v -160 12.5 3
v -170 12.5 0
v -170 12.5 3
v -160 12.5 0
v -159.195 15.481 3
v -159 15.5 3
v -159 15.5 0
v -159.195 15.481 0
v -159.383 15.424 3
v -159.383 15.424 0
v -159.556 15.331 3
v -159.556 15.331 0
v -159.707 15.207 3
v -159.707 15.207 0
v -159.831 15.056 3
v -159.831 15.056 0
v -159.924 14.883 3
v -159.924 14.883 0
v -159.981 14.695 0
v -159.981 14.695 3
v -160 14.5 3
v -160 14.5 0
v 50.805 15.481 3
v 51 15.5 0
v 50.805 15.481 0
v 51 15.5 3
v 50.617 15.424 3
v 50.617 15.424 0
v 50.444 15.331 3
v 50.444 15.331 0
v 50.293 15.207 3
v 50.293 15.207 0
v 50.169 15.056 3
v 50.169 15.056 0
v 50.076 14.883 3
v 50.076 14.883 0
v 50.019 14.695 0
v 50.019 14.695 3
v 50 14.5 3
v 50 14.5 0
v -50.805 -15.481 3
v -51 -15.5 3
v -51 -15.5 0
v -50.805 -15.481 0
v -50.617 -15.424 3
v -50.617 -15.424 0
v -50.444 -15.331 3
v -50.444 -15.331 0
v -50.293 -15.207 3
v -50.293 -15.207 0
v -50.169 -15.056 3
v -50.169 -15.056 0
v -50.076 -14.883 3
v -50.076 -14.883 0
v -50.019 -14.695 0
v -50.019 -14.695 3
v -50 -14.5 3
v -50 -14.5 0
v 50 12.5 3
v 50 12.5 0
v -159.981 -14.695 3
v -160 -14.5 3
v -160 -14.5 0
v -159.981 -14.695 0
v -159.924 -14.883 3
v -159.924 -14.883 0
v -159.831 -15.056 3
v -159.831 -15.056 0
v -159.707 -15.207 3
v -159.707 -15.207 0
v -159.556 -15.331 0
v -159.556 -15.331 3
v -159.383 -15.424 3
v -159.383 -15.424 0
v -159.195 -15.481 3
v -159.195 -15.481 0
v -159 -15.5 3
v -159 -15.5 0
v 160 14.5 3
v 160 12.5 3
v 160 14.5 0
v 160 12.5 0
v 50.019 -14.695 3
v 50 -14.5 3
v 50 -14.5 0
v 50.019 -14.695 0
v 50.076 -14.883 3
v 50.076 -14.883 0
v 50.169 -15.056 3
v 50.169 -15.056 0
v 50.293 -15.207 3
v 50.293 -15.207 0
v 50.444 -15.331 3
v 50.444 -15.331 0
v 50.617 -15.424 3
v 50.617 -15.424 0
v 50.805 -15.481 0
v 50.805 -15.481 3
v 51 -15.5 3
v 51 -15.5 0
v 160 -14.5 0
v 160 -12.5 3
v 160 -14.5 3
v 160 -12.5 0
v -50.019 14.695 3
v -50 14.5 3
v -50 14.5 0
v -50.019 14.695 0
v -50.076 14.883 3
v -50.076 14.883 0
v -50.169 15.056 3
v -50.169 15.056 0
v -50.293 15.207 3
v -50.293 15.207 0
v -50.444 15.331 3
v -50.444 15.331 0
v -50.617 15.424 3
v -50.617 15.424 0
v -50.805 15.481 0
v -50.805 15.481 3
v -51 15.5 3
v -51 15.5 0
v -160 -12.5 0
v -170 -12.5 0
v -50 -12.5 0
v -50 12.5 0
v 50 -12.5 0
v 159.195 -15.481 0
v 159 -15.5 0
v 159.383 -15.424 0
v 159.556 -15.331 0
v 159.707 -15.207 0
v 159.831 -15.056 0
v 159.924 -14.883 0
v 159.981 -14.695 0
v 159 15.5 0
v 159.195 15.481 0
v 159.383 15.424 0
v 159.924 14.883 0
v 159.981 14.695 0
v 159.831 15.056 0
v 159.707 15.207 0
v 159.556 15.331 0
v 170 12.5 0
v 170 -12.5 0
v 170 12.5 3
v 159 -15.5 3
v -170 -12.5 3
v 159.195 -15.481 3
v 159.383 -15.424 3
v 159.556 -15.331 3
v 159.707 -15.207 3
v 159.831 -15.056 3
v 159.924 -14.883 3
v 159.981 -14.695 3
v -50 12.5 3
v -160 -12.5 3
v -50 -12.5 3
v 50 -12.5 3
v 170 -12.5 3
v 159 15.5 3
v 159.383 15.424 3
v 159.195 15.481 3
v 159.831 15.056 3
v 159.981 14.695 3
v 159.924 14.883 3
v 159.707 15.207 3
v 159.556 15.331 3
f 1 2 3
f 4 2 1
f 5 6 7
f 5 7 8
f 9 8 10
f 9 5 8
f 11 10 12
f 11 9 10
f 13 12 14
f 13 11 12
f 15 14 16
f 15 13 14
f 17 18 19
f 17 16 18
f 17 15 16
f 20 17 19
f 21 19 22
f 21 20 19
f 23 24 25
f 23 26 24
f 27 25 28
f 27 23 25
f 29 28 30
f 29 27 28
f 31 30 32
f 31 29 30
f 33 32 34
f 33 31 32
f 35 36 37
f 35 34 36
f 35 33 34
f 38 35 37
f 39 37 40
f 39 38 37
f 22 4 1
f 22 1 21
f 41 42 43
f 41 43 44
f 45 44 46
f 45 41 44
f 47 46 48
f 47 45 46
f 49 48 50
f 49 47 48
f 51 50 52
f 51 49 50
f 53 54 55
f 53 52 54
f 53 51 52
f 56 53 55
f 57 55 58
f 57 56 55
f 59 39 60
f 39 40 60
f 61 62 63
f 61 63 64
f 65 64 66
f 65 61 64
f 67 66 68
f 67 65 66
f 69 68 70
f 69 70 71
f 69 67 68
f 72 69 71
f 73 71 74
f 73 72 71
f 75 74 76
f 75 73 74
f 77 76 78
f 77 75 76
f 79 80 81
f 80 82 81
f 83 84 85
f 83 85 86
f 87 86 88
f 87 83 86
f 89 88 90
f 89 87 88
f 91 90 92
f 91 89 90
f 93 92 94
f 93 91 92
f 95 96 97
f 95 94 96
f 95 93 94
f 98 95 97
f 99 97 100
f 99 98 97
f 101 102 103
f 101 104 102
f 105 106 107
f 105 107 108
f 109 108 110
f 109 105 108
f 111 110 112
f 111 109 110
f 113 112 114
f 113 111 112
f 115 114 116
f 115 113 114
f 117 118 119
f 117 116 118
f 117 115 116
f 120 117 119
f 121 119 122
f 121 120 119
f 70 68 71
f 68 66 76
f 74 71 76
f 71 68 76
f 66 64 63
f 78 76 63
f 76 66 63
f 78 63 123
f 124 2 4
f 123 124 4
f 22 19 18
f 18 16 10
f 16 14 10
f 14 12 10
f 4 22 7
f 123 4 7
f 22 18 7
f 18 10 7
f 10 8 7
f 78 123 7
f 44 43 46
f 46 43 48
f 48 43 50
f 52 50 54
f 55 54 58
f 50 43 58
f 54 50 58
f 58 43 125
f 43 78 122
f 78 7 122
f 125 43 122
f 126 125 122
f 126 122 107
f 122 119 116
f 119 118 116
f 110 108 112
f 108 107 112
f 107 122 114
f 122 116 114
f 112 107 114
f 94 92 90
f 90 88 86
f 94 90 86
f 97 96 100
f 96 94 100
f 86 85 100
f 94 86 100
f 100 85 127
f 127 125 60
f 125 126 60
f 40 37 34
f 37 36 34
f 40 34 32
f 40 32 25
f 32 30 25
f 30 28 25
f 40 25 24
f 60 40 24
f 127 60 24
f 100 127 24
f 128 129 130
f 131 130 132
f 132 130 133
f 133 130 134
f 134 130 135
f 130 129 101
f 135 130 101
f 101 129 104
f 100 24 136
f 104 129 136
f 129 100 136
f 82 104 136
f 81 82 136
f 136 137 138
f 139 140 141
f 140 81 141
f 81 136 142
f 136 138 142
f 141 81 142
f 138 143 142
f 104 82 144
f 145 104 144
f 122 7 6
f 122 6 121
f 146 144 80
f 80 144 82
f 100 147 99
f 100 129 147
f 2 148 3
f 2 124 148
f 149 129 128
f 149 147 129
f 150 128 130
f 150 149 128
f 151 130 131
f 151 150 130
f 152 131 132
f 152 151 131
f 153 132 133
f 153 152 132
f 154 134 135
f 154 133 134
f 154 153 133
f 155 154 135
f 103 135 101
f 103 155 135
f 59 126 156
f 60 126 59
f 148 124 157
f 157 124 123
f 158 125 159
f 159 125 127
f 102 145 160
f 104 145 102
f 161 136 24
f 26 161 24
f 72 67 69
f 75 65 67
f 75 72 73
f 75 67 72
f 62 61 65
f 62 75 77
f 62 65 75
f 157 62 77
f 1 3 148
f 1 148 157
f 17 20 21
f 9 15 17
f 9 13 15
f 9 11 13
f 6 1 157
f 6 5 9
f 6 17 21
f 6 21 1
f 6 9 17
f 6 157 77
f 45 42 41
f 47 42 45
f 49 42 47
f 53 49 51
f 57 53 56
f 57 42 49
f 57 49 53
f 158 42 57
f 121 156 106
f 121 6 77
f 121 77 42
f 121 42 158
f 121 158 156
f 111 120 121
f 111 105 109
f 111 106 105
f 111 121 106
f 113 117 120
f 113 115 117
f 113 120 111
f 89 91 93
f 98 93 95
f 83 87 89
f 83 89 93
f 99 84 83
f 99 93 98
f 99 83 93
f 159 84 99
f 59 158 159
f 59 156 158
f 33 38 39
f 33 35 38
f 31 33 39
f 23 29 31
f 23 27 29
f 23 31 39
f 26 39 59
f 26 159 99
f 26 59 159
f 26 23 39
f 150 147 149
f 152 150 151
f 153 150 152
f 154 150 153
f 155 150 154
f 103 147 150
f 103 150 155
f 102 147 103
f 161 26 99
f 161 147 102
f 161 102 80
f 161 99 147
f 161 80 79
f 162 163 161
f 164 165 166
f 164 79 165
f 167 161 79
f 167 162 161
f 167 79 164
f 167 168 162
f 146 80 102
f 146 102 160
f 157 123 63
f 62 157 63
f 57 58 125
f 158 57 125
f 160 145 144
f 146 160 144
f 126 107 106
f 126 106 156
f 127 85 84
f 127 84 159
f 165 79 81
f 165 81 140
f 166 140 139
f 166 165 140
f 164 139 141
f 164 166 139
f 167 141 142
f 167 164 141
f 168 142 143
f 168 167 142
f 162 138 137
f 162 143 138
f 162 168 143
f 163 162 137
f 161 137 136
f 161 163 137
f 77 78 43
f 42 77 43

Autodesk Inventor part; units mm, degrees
ref_plane "YZ Plane" through (0, 0, 0) normal (1, 0, 0) x (0, 1, 0)
ref_plane "XZ Plane" through (0, 0, 0) normal (0, 1, 0) x (-1, 0, 0)
ref_plane "XY Plane" through (0, 0, 0) normal (0, 0, 1) x (1, 0, 0)
sketch "Sketch1" plane through (0, 0, 0) normal (0, 0, 1) x (1, 0, 0)
  line L0 (-170, 0) -> (-170, 12.5)
  line L1 (-170, 12.5) -> (-160, 12.5)
  line L2 (-160, 12.5) -> (-160, 15.5)
  line L3 (-160, 15.5) -> (-50, 15.5)
  line L4 (-50, 15.5) -> (-50, 12.5)
  line L5 (-50, 12.5) -> (0, 12.5)
  line L6 (-238, 0) -> (238, 0) projected
  line L7 (-170, 0) -> (-170, -12.5)
  line L8 (-170, -12.5) -> (-160, -12.5)
  line L9 (-160, -12.5) -> (-160, -15.5)
  line L10 (-160, -15.5) -> (-50, -15.5)
  line L11 (-50, -15.5) -> (-50, -12.5)
  line L12 (-50, -12.5) -> (0, -12.5)
  line L13 (0, -21.7) -> (0, 21.7) projected
  line L14 (170, 0) -> (170, 12.5)
  line L15 (170, 12.5) -> (160, 12.5)
  line L16 (160, 12.5) -> (160, 15.5)
  line L17 (160, 15.5) -> (50, 15.5)
  line L18 (50, 15.5) -> (50, 12.5)
  line L19 (50, 12.5) -> (0, 12.5)
  line L20 (170, 0) -> (170, -12.5)
  line L21 (170, -12.5) -> (160, -12.5)
  line L22 (160, -12.5) -> (160, -15.5)
  line L23 (160, -15.5) -> (50, -15.5)
  line L24 (50, -15.5) -> (50, -12.5)
  line L25 (50, -12.5) -> (0, -12.5)
  point P0 (0, 0)
  point P1 (50, 14)
  point P2 (-50, 14)
  point P3 (-165, -12.5)
  point P4 (-165, 12.5)
  dimension "d0" = 3
  dimension "d2" = 100
  dimension "d3" = 10
  dimension "d4" = 110
  dimension "d5" = 25
extrude "Extrusion1" add sketch "Sketch1" along normal blind 3
fillet "Fillet1" radius 1 8 edges at (-160, 15.5, 1.5) (-50, 15.5, 1.5) (50, 15.5, 1.5) (160, 15.5, 1.5) (160, -15.5, 1.5) (50, -15.5, 1.5) (-50, -15.5, 1.5) (-160, -15.5, 1.5)
properties part number "ConectorPared"
